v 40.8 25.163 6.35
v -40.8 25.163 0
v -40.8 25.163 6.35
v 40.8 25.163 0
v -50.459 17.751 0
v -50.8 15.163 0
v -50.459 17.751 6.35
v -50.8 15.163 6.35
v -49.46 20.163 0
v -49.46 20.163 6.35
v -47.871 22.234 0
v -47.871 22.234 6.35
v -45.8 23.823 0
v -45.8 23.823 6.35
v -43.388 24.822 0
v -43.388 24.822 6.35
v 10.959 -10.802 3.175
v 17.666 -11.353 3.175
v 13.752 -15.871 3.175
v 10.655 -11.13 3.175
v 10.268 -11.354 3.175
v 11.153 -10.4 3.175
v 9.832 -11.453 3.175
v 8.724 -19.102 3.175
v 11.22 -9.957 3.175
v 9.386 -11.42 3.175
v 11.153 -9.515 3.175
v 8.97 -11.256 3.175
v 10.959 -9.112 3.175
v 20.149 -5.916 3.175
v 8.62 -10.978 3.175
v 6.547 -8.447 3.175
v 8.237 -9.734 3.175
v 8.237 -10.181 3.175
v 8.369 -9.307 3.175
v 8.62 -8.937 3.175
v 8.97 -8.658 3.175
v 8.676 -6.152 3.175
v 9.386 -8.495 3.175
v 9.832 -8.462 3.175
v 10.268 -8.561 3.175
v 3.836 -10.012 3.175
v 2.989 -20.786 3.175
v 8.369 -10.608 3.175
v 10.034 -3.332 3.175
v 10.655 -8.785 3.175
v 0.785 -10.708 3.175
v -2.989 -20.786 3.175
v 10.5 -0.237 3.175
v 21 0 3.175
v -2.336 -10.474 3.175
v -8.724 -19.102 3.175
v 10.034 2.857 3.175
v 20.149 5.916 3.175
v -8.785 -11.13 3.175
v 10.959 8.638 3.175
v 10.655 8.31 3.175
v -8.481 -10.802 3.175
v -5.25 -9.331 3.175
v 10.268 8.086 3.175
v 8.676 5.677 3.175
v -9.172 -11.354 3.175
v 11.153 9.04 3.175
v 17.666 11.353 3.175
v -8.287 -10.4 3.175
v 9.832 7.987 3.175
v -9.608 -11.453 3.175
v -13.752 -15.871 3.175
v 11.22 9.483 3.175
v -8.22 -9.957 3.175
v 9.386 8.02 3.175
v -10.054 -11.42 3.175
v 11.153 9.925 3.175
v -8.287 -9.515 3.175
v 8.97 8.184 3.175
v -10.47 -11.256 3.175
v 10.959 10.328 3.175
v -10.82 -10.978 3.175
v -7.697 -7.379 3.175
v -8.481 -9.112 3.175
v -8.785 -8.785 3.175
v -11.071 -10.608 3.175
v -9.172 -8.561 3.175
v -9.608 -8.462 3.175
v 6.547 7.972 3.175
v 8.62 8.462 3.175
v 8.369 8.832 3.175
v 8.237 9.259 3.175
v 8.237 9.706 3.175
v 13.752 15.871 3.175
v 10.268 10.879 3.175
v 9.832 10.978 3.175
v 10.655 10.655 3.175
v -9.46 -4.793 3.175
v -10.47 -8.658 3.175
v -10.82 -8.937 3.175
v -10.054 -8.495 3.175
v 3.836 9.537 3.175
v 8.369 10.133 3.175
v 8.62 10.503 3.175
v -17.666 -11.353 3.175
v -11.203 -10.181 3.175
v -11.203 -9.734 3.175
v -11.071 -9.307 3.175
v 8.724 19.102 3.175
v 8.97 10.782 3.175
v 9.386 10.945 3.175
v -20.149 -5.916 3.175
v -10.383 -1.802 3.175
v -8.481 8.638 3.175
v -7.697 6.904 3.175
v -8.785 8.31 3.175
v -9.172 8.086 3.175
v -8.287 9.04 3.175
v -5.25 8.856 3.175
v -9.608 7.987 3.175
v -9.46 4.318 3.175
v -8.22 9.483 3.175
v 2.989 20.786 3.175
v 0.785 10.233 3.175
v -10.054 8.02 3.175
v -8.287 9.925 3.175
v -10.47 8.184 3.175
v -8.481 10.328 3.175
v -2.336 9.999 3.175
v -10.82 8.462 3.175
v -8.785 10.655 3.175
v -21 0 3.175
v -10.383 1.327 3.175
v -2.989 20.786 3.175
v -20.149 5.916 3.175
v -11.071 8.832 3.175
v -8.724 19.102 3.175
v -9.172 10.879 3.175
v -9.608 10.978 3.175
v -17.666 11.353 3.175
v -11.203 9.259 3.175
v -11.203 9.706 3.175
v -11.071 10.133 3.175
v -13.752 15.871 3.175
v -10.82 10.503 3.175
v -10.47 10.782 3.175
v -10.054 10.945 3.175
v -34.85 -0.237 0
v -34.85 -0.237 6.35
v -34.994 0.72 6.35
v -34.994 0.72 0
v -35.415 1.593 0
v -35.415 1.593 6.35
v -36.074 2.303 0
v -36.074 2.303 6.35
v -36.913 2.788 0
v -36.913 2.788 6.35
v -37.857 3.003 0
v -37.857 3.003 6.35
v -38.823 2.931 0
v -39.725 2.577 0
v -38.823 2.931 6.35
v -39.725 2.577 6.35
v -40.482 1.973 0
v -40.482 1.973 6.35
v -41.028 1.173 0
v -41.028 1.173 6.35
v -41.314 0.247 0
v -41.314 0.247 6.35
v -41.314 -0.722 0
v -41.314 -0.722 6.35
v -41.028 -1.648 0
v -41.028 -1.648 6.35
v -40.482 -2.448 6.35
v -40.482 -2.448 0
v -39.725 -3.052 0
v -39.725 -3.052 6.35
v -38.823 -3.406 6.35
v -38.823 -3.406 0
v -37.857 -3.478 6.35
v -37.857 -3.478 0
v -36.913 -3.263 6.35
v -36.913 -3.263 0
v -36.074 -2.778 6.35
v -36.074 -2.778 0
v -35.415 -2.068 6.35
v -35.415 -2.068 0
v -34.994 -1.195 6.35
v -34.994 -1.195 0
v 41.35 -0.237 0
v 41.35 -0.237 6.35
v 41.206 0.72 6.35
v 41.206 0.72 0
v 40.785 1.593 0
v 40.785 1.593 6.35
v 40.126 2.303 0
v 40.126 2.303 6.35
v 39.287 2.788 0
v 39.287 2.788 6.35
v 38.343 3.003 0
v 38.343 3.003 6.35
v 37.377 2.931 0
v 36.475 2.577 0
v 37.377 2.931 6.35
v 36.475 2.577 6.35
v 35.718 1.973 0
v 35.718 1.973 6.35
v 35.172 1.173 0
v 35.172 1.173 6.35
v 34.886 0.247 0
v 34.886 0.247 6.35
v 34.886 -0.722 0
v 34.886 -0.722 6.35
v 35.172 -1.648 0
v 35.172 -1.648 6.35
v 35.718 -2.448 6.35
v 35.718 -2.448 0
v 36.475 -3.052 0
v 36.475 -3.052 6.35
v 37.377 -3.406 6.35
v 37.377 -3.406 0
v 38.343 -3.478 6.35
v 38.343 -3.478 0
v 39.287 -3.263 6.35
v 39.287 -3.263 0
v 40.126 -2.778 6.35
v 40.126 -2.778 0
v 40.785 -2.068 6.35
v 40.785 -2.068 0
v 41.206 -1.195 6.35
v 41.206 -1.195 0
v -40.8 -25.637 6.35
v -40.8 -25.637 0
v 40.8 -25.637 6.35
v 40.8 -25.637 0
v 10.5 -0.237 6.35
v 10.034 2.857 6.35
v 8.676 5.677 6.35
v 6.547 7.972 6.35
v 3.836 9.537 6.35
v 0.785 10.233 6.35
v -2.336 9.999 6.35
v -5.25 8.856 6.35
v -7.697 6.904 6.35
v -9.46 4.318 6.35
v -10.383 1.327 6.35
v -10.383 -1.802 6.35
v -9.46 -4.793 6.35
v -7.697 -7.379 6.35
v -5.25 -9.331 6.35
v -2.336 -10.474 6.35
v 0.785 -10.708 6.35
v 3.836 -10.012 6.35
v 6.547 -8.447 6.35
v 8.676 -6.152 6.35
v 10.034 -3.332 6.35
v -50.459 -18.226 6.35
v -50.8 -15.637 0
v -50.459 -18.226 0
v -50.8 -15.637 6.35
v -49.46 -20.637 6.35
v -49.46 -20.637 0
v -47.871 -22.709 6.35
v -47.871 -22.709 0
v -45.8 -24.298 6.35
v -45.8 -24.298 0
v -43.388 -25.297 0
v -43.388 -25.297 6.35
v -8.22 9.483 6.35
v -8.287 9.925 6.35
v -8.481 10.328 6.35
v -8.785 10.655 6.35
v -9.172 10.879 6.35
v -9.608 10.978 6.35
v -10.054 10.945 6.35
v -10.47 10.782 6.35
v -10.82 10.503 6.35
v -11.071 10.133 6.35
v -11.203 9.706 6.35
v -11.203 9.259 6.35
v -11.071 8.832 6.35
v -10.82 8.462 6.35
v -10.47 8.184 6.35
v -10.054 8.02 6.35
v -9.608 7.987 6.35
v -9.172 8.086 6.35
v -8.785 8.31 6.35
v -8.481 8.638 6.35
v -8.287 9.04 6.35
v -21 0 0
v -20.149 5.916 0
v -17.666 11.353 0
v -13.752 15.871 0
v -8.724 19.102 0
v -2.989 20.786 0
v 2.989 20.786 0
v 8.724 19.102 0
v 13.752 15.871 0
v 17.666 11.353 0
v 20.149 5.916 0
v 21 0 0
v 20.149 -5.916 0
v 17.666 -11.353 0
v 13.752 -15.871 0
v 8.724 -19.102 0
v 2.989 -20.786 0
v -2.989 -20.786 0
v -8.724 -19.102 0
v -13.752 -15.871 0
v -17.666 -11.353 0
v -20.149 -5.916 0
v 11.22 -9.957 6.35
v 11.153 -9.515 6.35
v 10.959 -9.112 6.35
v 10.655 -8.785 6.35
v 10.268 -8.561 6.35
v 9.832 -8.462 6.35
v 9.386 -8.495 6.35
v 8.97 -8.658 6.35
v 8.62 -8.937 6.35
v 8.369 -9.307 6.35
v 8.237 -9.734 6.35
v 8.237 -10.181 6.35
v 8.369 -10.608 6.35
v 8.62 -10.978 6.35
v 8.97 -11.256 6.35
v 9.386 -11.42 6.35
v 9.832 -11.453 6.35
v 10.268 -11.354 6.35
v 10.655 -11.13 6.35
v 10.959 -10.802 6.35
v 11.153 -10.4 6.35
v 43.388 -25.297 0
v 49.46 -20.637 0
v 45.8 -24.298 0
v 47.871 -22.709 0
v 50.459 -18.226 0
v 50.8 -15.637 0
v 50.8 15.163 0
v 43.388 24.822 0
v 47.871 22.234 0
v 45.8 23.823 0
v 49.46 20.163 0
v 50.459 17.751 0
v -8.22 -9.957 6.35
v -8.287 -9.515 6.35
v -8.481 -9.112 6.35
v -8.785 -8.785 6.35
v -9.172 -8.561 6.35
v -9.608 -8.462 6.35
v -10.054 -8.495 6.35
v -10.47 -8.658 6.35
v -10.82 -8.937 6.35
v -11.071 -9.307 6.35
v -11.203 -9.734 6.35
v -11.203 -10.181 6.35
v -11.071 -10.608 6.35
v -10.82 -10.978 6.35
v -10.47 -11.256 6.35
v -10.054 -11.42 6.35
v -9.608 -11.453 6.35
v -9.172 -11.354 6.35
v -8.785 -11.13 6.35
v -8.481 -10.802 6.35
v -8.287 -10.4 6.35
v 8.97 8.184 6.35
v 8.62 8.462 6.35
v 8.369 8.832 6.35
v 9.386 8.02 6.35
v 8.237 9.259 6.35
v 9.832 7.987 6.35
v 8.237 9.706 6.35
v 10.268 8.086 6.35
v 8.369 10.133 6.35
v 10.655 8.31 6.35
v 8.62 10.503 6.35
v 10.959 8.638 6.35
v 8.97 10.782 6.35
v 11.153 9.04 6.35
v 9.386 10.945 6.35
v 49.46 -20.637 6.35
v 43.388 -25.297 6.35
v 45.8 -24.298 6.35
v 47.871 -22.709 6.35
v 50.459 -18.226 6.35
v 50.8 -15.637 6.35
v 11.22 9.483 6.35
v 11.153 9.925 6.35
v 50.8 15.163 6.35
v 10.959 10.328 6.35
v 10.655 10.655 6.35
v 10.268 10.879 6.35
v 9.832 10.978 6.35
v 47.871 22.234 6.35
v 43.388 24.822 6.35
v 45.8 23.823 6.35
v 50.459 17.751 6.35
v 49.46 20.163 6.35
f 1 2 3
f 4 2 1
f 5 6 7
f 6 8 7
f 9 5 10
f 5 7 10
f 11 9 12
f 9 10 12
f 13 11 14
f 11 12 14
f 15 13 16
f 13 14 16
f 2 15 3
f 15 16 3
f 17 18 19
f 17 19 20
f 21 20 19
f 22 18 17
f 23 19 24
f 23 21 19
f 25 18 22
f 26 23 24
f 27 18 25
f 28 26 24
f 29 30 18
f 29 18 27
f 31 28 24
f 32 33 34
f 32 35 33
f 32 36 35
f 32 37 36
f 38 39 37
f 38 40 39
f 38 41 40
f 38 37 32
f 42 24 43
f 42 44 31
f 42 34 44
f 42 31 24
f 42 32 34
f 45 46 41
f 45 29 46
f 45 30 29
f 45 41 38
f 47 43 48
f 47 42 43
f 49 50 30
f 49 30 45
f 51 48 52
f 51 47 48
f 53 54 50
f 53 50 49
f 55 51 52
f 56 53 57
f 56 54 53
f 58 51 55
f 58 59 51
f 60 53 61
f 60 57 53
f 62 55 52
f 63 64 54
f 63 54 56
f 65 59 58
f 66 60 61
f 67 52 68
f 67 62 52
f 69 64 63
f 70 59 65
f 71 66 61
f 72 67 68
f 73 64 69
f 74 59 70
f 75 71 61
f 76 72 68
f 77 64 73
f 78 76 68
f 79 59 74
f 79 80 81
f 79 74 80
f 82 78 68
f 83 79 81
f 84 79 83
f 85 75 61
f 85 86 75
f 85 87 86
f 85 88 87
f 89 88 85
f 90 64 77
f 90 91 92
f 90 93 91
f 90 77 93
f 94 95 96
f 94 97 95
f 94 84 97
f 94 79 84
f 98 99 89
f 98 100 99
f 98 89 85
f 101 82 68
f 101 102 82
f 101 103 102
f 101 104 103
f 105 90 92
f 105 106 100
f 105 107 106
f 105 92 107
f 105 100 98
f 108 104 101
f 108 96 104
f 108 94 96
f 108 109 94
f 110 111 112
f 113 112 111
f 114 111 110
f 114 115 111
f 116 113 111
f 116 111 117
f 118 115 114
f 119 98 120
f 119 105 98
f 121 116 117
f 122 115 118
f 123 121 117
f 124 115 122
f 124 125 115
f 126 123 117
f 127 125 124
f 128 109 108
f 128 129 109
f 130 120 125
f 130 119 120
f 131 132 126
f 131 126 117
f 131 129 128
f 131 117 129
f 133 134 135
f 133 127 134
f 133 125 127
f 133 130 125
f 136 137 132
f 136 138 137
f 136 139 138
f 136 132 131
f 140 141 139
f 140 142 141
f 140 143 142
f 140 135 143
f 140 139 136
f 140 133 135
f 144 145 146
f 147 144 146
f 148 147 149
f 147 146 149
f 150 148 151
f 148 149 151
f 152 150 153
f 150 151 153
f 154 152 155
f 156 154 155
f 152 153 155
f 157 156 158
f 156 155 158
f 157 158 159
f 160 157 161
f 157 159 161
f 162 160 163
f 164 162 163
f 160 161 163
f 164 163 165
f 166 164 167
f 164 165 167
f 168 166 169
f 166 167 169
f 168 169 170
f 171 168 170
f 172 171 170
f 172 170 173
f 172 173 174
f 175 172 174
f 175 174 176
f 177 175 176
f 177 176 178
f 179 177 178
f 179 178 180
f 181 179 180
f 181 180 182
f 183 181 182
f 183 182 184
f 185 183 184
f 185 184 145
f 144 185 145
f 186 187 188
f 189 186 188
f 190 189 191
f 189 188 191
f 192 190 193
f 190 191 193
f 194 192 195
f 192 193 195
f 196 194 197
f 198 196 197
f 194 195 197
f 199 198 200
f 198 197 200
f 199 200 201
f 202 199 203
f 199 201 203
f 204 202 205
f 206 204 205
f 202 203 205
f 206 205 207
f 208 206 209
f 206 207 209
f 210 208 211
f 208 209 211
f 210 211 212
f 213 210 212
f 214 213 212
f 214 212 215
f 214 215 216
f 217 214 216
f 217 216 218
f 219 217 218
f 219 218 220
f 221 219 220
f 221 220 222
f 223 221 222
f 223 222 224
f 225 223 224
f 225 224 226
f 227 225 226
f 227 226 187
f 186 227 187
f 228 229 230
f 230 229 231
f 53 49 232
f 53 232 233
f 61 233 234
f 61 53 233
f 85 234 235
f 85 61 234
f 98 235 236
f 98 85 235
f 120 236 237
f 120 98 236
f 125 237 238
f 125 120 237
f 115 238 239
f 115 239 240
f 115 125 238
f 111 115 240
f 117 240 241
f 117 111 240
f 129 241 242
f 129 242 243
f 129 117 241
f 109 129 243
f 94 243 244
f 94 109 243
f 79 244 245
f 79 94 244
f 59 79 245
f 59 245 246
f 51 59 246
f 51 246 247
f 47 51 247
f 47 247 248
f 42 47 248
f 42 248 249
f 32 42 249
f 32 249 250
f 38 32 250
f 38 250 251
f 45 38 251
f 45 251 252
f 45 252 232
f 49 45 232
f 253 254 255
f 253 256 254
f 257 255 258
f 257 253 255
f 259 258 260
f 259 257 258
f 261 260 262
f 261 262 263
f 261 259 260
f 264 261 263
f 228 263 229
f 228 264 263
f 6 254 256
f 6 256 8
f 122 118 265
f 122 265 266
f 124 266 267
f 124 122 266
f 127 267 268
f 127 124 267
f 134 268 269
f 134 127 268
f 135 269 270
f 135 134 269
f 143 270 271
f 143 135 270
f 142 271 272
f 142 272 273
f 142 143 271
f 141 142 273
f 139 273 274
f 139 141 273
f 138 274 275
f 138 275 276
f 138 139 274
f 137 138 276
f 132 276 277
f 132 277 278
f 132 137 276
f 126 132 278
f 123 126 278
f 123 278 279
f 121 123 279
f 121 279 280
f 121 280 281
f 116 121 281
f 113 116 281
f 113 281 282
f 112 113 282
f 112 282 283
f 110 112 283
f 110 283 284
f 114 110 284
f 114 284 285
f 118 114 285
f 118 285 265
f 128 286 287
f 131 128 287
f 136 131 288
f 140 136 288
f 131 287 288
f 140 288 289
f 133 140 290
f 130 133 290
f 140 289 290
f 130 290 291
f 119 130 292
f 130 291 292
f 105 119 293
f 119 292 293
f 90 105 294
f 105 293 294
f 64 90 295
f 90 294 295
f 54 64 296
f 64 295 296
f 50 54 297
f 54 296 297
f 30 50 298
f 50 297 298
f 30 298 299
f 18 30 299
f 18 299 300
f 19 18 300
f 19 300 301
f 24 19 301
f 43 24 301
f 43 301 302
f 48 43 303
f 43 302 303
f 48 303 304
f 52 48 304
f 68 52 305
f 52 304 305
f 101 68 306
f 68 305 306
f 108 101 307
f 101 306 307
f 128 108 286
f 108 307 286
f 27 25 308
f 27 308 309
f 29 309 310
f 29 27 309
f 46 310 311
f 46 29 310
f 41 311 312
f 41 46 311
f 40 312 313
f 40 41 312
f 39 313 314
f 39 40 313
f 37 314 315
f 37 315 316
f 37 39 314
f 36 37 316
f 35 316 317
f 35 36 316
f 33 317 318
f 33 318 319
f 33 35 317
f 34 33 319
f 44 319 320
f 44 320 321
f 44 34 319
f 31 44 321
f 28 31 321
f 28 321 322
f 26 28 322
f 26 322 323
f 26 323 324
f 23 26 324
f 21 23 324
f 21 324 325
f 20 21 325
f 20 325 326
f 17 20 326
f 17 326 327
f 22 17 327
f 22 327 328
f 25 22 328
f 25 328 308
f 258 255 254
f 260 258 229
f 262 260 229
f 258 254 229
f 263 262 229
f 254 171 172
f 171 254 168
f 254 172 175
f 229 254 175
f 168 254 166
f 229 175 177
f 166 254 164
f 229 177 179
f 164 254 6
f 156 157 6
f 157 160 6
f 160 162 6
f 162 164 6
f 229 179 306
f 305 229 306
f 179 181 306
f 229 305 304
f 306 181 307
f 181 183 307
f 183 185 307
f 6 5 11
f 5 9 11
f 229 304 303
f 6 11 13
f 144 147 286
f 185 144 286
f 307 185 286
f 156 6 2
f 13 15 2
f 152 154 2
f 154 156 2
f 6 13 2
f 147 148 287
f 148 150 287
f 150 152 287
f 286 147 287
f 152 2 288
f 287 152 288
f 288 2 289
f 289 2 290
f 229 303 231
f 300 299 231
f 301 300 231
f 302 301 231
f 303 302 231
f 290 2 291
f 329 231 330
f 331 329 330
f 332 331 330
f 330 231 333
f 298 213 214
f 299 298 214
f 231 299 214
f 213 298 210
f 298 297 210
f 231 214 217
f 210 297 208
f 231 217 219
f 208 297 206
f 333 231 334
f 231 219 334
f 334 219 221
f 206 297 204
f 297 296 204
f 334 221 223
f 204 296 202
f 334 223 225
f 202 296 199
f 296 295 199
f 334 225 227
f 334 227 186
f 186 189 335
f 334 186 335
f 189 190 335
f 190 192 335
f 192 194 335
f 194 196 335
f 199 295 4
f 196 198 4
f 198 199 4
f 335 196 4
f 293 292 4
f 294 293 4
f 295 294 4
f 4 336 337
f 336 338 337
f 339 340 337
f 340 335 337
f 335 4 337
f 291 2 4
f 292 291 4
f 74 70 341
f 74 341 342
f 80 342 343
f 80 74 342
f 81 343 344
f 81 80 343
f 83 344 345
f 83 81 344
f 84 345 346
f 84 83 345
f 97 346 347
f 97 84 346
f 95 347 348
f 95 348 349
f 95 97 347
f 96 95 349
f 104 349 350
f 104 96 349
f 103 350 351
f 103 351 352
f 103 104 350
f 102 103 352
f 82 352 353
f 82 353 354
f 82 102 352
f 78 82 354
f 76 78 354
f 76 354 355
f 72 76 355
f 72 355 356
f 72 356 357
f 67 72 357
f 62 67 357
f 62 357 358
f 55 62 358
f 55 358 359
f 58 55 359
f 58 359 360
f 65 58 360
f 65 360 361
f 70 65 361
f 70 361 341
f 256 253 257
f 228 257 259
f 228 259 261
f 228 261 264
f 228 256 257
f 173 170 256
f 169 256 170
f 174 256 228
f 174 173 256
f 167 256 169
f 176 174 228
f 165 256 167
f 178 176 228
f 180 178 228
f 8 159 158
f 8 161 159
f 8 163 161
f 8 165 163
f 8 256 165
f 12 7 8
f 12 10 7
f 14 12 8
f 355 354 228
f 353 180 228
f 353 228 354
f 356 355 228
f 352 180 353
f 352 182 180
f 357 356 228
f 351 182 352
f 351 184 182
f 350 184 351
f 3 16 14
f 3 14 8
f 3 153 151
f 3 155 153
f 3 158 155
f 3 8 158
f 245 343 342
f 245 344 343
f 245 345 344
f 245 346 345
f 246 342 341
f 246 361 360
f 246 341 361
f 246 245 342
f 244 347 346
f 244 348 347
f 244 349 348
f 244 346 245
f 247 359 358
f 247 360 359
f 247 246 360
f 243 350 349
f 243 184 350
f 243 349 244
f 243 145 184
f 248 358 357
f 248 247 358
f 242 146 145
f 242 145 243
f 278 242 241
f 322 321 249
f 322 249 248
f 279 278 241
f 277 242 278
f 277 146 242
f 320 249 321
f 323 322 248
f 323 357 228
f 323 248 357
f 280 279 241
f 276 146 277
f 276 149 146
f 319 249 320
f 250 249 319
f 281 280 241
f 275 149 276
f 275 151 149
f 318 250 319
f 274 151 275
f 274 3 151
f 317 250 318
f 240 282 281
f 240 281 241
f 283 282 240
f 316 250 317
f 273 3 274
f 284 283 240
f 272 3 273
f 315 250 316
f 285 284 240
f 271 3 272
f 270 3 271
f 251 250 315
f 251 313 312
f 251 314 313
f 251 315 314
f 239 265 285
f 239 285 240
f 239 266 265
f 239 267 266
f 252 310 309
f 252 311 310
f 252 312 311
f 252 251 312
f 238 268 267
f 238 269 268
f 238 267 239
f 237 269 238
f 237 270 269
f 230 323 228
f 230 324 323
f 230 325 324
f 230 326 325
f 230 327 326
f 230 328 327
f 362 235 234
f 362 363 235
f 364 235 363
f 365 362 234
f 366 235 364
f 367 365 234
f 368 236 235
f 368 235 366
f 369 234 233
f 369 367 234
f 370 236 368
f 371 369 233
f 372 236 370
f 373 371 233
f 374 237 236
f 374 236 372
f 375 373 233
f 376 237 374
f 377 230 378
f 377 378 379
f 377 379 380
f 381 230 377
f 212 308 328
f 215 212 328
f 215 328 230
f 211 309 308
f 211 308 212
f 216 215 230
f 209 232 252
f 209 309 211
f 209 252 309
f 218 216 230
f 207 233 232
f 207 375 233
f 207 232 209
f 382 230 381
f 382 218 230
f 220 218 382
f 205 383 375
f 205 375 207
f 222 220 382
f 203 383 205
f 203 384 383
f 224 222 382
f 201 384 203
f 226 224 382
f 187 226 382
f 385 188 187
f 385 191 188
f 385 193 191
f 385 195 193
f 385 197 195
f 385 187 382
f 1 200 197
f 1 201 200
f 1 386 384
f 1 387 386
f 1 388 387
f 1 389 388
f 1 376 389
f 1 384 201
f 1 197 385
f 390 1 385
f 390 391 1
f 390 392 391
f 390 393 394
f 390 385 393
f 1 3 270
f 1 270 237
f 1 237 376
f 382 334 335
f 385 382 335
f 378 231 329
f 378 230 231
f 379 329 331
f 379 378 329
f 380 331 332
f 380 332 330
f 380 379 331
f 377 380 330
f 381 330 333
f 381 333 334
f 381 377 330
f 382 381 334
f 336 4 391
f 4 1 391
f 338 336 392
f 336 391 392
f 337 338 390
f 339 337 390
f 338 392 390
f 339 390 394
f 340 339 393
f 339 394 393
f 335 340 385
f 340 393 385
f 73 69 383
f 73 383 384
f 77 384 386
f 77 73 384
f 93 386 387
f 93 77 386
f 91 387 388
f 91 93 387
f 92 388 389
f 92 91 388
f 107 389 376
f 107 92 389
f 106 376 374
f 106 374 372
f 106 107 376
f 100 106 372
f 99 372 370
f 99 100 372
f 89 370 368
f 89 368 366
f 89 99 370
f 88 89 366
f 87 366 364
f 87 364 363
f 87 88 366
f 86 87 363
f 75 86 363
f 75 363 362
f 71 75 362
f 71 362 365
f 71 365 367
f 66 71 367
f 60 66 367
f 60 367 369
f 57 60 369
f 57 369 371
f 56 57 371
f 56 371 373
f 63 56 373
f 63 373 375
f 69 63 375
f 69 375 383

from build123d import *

# Parameters (mm, degrees)
SKETCH1_W           = 101.6
SKETCH1_H           = 50.8
SKETCH1_R           = 10.5
SKETCH1_R_2         = 1.5
BOSS_EXTRUDE1_DEPTH = 6.35
SKETCH2_R           = 21
CUT_EXTRUDE1_DEPTH  = 3.175
SKETCH3_R           = 3.25
CUT_EXTRUDE2_DEPTH  = 7.35
FILLET1_R           = 10


with BuildPart() as part:
    # Sketch1 → Boss-Extrude1 (new body)
    with BuildSketch(Plane.XY):
        with Locations((0, -0.237458689)):
            Rectangle(SKETCH1_W, SKETCH1_H)
        with Locations((0, -0.237458689)):
            Circle(SKETCH1_R, mode=Mode.SUBTRACT)
        with Locations((-9.72, 9.482541311)):
            Circle(SKETCH1_R_2, mode=Mode.SUBTRACT)
        with Locations((9.72, 9.482541311)):
            Circle(SKETCH1_R_2, mode=Mode.SUBTRACT)
        with Locations((9.72, -9.957458689)):
            Circle(SKETCH1_R_2, mode=Mode.SUBTRACT)
        with Locations((-9.72, -9.957458689)):
            Circle(SKETCH1_R_2, mode=Mode.SUBTRACT)
    extrude(amount=BOSS_EXTRUDE1_DEPTH)

    # Sketch2 → Cut-Extrude1 (cut)
    with BuildSketch(Plane(origin=(0, 0, 0), x_dir=(-1, 0, 0), z_dir=(0, 0, -1))):
        Circle(SKETCH2_R)
    extrude(amount=-CUT_EXTRUDE1_DEPTH, mode=Mode.SUBTRACT)

    # Sketch3 → Cut-Extrude2 (cut, through all)
    with BuildSketch(Plane.XY.offset(6.35)):
        with Locations((-38.1, -0.237458689)):
            Circle(SKETCH3_R)
        with Locations((38.1, -0.237458689)):
            Circle(SKETCH3_R)
    extrude(amount=-CUT_EXTRUDE2_DEPTH, mode=Mode.SUBTRACT)

    # Fillet1
    fillet1_edges = [part.edges().sort_by_distance(p)[0] for p in [
        (50.8, -25.637458689, 3.175),
        (-50.8, -25.637458689, 3.175),
        (-50.8, 25.162541311, 3.175),
        (50.8, 25.162541311, 3.175),
    ]]
    fillet(fillet1_edges, radius=FILLET1_R)


solid = part.part
